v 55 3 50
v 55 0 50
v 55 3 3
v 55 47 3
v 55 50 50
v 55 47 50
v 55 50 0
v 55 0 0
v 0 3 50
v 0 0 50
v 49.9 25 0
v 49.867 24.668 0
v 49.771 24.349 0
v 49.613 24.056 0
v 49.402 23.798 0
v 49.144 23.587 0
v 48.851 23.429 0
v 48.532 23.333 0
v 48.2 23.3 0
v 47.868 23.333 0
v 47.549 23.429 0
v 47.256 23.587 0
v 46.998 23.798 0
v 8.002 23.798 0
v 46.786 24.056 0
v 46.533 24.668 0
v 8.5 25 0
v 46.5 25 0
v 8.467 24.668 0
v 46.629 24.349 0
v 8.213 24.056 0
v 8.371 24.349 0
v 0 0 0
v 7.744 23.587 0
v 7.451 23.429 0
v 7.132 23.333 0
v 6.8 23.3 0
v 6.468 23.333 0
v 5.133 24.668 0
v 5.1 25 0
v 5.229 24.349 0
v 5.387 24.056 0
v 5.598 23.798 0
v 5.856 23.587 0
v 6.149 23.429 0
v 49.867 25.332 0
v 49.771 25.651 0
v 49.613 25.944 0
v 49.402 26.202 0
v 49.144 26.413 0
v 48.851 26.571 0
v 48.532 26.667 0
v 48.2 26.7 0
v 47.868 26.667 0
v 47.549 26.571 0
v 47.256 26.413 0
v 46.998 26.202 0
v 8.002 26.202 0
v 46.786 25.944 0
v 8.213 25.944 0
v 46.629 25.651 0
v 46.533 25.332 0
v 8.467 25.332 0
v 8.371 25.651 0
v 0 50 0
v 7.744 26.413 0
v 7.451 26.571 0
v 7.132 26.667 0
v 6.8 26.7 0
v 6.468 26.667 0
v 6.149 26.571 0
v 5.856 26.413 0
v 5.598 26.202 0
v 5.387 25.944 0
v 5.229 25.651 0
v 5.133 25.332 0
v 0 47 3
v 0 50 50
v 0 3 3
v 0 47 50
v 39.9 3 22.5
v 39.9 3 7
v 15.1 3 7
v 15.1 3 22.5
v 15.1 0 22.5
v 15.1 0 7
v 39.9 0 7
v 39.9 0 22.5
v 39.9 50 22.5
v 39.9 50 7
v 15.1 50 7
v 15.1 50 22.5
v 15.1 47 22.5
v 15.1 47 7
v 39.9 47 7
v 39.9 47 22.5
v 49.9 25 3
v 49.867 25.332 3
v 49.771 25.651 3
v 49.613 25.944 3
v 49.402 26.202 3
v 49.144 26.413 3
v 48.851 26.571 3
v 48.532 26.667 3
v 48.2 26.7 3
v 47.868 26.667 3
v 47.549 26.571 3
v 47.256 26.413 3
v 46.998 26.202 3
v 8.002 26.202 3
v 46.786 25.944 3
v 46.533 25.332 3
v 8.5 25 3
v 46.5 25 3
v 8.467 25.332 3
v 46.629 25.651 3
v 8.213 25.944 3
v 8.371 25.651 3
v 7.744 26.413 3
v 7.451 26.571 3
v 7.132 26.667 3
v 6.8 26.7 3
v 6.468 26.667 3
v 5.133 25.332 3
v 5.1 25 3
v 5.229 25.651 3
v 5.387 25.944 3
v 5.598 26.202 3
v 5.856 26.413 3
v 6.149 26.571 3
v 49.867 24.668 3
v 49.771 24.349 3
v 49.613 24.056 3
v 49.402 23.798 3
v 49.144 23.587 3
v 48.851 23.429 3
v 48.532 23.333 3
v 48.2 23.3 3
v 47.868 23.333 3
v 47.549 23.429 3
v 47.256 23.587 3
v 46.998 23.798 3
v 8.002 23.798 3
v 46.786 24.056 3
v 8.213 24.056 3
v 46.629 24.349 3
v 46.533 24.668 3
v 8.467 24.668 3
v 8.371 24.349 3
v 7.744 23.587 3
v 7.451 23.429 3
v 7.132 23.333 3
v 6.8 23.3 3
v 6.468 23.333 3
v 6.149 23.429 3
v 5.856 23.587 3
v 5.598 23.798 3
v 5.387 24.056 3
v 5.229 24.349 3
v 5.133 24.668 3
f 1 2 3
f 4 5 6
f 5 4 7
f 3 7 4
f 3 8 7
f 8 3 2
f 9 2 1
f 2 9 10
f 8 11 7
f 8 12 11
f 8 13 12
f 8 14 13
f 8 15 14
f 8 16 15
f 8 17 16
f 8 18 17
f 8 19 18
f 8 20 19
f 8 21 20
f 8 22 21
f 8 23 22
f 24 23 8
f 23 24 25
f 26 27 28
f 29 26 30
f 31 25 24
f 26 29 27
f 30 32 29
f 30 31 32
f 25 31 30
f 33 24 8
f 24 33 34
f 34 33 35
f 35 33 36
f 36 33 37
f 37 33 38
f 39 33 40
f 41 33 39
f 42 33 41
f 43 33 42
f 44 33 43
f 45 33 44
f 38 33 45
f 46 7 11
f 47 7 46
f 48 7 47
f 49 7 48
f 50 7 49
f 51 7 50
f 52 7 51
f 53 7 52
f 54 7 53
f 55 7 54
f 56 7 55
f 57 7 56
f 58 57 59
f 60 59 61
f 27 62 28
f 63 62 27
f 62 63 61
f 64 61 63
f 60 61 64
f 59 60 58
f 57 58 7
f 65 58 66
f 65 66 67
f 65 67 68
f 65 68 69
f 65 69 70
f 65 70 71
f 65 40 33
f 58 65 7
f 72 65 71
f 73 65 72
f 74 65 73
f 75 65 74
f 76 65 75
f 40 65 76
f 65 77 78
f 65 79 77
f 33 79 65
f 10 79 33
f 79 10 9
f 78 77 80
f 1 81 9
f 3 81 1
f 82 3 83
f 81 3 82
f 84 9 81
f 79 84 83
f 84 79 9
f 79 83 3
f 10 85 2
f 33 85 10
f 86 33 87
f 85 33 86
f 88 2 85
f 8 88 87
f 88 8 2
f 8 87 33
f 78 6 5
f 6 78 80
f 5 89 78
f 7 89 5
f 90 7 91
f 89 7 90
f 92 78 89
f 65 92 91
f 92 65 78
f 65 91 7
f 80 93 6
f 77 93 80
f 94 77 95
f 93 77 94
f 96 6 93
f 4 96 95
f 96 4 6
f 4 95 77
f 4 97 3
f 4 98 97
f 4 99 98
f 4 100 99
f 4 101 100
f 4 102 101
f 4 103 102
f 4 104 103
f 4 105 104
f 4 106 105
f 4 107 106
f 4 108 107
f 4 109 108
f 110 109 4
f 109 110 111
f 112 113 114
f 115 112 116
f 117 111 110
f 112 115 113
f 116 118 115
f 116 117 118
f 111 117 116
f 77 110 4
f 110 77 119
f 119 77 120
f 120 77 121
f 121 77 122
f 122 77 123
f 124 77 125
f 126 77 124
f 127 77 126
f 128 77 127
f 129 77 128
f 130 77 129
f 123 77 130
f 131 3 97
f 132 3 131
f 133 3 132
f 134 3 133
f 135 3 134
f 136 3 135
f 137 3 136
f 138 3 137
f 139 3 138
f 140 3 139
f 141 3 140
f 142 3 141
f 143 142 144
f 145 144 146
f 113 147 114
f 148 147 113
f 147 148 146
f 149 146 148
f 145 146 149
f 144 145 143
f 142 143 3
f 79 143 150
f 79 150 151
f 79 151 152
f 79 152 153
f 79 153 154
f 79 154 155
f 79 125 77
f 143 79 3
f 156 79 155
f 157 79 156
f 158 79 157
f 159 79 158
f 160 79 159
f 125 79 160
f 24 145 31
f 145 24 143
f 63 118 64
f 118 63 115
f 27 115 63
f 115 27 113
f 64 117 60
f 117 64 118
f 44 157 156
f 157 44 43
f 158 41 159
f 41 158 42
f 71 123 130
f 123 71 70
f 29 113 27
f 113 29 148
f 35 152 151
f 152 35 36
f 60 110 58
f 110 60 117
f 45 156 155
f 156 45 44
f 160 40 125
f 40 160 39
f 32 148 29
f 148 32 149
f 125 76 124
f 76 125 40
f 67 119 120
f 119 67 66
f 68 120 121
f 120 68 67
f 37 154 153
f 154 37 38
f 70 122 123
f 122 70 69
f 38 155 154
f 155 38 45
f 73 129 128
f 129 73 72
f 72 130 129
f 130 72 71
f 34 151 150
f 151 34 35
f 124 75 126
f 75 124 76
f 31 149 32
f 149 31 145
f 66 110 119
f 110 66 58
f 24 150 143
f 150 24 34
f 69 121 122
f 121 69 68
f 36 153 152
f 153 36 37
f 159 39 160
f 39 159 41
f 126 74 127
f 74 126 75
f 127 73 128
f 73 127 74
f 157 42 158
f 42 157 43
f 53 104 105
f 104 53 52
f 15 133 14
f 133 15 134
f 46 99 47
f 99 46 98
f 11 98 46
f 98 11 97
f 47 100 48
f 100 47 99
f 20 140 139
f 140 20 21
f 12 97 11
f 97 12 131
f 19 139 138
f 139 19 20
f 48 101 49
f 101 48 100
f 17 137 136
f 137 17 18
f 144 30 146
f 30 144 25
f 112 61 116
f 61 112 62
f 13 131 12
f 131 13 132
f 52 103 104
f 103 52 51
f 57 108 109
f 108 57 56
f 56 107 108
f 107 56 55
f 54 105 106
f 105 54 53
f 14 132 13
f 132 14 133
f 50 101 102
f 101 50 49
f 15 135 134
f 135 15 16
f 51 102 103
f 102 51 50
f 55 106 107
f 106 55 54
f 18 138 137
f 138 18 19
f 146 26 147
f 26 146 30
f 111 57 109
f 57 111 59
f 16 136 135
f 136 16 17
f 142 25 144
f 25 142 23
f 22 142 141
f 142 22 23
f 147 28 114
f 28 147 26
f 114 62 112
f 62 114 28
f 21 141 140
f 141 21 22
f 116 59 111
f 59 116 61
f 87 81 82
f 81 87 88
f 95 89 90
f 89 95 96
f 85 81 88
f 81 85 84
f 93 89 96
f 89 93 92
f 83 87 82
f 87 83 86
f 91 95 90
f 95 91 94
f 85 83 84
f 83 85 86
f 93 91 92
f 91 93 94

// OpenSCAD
$fn = 32;

// ----------------------------------------------------------------------
// U-bracket: 55 x 50 x 50 mm
// ----------------------------------------------------------------------

// --- parameters (mm) ---
span = 55;                // outer length, X
outer_w = 50;             // outer width, Y
wall_h = 50;              // upright height, Z
plate_t = 3;              // wall thickness
hole_d = 3.4;             // clearance for M3
window_l = 24.8;          // window length
window_h = 15.5;          // window height

module hole_z(px, py) {
  translate([px, py, -0.5]) cylinder(h = plate_t + 1, d = hole_d);
}
module hole_y_pz(pz) {
  /* through both uprights along Y */
  translate([0, -0.5, pz]) rotate([-90, 0, 0]) cylinder(h = outer_w + 1, d = hole_d);
}

module base() {
  cube([span, outer_w, plate_t]);
}

module uprights() {
  cube([span, plate_t, wall_h]);
  translate([0, outer_w - plate_t, 0]) cube([span, plate_t, wall_h]);
}

difference() {
  union() {
    base();
    uprights();
  }
  hole_z(6.8, 25);
  hole_z(48.2, 25);
  /* lightening window through both uprights */
  translate([span / 2 - window_l / 2, -1, plate_t + 4])
    cube([window_l, outer_w + 2, window_h]);
}
